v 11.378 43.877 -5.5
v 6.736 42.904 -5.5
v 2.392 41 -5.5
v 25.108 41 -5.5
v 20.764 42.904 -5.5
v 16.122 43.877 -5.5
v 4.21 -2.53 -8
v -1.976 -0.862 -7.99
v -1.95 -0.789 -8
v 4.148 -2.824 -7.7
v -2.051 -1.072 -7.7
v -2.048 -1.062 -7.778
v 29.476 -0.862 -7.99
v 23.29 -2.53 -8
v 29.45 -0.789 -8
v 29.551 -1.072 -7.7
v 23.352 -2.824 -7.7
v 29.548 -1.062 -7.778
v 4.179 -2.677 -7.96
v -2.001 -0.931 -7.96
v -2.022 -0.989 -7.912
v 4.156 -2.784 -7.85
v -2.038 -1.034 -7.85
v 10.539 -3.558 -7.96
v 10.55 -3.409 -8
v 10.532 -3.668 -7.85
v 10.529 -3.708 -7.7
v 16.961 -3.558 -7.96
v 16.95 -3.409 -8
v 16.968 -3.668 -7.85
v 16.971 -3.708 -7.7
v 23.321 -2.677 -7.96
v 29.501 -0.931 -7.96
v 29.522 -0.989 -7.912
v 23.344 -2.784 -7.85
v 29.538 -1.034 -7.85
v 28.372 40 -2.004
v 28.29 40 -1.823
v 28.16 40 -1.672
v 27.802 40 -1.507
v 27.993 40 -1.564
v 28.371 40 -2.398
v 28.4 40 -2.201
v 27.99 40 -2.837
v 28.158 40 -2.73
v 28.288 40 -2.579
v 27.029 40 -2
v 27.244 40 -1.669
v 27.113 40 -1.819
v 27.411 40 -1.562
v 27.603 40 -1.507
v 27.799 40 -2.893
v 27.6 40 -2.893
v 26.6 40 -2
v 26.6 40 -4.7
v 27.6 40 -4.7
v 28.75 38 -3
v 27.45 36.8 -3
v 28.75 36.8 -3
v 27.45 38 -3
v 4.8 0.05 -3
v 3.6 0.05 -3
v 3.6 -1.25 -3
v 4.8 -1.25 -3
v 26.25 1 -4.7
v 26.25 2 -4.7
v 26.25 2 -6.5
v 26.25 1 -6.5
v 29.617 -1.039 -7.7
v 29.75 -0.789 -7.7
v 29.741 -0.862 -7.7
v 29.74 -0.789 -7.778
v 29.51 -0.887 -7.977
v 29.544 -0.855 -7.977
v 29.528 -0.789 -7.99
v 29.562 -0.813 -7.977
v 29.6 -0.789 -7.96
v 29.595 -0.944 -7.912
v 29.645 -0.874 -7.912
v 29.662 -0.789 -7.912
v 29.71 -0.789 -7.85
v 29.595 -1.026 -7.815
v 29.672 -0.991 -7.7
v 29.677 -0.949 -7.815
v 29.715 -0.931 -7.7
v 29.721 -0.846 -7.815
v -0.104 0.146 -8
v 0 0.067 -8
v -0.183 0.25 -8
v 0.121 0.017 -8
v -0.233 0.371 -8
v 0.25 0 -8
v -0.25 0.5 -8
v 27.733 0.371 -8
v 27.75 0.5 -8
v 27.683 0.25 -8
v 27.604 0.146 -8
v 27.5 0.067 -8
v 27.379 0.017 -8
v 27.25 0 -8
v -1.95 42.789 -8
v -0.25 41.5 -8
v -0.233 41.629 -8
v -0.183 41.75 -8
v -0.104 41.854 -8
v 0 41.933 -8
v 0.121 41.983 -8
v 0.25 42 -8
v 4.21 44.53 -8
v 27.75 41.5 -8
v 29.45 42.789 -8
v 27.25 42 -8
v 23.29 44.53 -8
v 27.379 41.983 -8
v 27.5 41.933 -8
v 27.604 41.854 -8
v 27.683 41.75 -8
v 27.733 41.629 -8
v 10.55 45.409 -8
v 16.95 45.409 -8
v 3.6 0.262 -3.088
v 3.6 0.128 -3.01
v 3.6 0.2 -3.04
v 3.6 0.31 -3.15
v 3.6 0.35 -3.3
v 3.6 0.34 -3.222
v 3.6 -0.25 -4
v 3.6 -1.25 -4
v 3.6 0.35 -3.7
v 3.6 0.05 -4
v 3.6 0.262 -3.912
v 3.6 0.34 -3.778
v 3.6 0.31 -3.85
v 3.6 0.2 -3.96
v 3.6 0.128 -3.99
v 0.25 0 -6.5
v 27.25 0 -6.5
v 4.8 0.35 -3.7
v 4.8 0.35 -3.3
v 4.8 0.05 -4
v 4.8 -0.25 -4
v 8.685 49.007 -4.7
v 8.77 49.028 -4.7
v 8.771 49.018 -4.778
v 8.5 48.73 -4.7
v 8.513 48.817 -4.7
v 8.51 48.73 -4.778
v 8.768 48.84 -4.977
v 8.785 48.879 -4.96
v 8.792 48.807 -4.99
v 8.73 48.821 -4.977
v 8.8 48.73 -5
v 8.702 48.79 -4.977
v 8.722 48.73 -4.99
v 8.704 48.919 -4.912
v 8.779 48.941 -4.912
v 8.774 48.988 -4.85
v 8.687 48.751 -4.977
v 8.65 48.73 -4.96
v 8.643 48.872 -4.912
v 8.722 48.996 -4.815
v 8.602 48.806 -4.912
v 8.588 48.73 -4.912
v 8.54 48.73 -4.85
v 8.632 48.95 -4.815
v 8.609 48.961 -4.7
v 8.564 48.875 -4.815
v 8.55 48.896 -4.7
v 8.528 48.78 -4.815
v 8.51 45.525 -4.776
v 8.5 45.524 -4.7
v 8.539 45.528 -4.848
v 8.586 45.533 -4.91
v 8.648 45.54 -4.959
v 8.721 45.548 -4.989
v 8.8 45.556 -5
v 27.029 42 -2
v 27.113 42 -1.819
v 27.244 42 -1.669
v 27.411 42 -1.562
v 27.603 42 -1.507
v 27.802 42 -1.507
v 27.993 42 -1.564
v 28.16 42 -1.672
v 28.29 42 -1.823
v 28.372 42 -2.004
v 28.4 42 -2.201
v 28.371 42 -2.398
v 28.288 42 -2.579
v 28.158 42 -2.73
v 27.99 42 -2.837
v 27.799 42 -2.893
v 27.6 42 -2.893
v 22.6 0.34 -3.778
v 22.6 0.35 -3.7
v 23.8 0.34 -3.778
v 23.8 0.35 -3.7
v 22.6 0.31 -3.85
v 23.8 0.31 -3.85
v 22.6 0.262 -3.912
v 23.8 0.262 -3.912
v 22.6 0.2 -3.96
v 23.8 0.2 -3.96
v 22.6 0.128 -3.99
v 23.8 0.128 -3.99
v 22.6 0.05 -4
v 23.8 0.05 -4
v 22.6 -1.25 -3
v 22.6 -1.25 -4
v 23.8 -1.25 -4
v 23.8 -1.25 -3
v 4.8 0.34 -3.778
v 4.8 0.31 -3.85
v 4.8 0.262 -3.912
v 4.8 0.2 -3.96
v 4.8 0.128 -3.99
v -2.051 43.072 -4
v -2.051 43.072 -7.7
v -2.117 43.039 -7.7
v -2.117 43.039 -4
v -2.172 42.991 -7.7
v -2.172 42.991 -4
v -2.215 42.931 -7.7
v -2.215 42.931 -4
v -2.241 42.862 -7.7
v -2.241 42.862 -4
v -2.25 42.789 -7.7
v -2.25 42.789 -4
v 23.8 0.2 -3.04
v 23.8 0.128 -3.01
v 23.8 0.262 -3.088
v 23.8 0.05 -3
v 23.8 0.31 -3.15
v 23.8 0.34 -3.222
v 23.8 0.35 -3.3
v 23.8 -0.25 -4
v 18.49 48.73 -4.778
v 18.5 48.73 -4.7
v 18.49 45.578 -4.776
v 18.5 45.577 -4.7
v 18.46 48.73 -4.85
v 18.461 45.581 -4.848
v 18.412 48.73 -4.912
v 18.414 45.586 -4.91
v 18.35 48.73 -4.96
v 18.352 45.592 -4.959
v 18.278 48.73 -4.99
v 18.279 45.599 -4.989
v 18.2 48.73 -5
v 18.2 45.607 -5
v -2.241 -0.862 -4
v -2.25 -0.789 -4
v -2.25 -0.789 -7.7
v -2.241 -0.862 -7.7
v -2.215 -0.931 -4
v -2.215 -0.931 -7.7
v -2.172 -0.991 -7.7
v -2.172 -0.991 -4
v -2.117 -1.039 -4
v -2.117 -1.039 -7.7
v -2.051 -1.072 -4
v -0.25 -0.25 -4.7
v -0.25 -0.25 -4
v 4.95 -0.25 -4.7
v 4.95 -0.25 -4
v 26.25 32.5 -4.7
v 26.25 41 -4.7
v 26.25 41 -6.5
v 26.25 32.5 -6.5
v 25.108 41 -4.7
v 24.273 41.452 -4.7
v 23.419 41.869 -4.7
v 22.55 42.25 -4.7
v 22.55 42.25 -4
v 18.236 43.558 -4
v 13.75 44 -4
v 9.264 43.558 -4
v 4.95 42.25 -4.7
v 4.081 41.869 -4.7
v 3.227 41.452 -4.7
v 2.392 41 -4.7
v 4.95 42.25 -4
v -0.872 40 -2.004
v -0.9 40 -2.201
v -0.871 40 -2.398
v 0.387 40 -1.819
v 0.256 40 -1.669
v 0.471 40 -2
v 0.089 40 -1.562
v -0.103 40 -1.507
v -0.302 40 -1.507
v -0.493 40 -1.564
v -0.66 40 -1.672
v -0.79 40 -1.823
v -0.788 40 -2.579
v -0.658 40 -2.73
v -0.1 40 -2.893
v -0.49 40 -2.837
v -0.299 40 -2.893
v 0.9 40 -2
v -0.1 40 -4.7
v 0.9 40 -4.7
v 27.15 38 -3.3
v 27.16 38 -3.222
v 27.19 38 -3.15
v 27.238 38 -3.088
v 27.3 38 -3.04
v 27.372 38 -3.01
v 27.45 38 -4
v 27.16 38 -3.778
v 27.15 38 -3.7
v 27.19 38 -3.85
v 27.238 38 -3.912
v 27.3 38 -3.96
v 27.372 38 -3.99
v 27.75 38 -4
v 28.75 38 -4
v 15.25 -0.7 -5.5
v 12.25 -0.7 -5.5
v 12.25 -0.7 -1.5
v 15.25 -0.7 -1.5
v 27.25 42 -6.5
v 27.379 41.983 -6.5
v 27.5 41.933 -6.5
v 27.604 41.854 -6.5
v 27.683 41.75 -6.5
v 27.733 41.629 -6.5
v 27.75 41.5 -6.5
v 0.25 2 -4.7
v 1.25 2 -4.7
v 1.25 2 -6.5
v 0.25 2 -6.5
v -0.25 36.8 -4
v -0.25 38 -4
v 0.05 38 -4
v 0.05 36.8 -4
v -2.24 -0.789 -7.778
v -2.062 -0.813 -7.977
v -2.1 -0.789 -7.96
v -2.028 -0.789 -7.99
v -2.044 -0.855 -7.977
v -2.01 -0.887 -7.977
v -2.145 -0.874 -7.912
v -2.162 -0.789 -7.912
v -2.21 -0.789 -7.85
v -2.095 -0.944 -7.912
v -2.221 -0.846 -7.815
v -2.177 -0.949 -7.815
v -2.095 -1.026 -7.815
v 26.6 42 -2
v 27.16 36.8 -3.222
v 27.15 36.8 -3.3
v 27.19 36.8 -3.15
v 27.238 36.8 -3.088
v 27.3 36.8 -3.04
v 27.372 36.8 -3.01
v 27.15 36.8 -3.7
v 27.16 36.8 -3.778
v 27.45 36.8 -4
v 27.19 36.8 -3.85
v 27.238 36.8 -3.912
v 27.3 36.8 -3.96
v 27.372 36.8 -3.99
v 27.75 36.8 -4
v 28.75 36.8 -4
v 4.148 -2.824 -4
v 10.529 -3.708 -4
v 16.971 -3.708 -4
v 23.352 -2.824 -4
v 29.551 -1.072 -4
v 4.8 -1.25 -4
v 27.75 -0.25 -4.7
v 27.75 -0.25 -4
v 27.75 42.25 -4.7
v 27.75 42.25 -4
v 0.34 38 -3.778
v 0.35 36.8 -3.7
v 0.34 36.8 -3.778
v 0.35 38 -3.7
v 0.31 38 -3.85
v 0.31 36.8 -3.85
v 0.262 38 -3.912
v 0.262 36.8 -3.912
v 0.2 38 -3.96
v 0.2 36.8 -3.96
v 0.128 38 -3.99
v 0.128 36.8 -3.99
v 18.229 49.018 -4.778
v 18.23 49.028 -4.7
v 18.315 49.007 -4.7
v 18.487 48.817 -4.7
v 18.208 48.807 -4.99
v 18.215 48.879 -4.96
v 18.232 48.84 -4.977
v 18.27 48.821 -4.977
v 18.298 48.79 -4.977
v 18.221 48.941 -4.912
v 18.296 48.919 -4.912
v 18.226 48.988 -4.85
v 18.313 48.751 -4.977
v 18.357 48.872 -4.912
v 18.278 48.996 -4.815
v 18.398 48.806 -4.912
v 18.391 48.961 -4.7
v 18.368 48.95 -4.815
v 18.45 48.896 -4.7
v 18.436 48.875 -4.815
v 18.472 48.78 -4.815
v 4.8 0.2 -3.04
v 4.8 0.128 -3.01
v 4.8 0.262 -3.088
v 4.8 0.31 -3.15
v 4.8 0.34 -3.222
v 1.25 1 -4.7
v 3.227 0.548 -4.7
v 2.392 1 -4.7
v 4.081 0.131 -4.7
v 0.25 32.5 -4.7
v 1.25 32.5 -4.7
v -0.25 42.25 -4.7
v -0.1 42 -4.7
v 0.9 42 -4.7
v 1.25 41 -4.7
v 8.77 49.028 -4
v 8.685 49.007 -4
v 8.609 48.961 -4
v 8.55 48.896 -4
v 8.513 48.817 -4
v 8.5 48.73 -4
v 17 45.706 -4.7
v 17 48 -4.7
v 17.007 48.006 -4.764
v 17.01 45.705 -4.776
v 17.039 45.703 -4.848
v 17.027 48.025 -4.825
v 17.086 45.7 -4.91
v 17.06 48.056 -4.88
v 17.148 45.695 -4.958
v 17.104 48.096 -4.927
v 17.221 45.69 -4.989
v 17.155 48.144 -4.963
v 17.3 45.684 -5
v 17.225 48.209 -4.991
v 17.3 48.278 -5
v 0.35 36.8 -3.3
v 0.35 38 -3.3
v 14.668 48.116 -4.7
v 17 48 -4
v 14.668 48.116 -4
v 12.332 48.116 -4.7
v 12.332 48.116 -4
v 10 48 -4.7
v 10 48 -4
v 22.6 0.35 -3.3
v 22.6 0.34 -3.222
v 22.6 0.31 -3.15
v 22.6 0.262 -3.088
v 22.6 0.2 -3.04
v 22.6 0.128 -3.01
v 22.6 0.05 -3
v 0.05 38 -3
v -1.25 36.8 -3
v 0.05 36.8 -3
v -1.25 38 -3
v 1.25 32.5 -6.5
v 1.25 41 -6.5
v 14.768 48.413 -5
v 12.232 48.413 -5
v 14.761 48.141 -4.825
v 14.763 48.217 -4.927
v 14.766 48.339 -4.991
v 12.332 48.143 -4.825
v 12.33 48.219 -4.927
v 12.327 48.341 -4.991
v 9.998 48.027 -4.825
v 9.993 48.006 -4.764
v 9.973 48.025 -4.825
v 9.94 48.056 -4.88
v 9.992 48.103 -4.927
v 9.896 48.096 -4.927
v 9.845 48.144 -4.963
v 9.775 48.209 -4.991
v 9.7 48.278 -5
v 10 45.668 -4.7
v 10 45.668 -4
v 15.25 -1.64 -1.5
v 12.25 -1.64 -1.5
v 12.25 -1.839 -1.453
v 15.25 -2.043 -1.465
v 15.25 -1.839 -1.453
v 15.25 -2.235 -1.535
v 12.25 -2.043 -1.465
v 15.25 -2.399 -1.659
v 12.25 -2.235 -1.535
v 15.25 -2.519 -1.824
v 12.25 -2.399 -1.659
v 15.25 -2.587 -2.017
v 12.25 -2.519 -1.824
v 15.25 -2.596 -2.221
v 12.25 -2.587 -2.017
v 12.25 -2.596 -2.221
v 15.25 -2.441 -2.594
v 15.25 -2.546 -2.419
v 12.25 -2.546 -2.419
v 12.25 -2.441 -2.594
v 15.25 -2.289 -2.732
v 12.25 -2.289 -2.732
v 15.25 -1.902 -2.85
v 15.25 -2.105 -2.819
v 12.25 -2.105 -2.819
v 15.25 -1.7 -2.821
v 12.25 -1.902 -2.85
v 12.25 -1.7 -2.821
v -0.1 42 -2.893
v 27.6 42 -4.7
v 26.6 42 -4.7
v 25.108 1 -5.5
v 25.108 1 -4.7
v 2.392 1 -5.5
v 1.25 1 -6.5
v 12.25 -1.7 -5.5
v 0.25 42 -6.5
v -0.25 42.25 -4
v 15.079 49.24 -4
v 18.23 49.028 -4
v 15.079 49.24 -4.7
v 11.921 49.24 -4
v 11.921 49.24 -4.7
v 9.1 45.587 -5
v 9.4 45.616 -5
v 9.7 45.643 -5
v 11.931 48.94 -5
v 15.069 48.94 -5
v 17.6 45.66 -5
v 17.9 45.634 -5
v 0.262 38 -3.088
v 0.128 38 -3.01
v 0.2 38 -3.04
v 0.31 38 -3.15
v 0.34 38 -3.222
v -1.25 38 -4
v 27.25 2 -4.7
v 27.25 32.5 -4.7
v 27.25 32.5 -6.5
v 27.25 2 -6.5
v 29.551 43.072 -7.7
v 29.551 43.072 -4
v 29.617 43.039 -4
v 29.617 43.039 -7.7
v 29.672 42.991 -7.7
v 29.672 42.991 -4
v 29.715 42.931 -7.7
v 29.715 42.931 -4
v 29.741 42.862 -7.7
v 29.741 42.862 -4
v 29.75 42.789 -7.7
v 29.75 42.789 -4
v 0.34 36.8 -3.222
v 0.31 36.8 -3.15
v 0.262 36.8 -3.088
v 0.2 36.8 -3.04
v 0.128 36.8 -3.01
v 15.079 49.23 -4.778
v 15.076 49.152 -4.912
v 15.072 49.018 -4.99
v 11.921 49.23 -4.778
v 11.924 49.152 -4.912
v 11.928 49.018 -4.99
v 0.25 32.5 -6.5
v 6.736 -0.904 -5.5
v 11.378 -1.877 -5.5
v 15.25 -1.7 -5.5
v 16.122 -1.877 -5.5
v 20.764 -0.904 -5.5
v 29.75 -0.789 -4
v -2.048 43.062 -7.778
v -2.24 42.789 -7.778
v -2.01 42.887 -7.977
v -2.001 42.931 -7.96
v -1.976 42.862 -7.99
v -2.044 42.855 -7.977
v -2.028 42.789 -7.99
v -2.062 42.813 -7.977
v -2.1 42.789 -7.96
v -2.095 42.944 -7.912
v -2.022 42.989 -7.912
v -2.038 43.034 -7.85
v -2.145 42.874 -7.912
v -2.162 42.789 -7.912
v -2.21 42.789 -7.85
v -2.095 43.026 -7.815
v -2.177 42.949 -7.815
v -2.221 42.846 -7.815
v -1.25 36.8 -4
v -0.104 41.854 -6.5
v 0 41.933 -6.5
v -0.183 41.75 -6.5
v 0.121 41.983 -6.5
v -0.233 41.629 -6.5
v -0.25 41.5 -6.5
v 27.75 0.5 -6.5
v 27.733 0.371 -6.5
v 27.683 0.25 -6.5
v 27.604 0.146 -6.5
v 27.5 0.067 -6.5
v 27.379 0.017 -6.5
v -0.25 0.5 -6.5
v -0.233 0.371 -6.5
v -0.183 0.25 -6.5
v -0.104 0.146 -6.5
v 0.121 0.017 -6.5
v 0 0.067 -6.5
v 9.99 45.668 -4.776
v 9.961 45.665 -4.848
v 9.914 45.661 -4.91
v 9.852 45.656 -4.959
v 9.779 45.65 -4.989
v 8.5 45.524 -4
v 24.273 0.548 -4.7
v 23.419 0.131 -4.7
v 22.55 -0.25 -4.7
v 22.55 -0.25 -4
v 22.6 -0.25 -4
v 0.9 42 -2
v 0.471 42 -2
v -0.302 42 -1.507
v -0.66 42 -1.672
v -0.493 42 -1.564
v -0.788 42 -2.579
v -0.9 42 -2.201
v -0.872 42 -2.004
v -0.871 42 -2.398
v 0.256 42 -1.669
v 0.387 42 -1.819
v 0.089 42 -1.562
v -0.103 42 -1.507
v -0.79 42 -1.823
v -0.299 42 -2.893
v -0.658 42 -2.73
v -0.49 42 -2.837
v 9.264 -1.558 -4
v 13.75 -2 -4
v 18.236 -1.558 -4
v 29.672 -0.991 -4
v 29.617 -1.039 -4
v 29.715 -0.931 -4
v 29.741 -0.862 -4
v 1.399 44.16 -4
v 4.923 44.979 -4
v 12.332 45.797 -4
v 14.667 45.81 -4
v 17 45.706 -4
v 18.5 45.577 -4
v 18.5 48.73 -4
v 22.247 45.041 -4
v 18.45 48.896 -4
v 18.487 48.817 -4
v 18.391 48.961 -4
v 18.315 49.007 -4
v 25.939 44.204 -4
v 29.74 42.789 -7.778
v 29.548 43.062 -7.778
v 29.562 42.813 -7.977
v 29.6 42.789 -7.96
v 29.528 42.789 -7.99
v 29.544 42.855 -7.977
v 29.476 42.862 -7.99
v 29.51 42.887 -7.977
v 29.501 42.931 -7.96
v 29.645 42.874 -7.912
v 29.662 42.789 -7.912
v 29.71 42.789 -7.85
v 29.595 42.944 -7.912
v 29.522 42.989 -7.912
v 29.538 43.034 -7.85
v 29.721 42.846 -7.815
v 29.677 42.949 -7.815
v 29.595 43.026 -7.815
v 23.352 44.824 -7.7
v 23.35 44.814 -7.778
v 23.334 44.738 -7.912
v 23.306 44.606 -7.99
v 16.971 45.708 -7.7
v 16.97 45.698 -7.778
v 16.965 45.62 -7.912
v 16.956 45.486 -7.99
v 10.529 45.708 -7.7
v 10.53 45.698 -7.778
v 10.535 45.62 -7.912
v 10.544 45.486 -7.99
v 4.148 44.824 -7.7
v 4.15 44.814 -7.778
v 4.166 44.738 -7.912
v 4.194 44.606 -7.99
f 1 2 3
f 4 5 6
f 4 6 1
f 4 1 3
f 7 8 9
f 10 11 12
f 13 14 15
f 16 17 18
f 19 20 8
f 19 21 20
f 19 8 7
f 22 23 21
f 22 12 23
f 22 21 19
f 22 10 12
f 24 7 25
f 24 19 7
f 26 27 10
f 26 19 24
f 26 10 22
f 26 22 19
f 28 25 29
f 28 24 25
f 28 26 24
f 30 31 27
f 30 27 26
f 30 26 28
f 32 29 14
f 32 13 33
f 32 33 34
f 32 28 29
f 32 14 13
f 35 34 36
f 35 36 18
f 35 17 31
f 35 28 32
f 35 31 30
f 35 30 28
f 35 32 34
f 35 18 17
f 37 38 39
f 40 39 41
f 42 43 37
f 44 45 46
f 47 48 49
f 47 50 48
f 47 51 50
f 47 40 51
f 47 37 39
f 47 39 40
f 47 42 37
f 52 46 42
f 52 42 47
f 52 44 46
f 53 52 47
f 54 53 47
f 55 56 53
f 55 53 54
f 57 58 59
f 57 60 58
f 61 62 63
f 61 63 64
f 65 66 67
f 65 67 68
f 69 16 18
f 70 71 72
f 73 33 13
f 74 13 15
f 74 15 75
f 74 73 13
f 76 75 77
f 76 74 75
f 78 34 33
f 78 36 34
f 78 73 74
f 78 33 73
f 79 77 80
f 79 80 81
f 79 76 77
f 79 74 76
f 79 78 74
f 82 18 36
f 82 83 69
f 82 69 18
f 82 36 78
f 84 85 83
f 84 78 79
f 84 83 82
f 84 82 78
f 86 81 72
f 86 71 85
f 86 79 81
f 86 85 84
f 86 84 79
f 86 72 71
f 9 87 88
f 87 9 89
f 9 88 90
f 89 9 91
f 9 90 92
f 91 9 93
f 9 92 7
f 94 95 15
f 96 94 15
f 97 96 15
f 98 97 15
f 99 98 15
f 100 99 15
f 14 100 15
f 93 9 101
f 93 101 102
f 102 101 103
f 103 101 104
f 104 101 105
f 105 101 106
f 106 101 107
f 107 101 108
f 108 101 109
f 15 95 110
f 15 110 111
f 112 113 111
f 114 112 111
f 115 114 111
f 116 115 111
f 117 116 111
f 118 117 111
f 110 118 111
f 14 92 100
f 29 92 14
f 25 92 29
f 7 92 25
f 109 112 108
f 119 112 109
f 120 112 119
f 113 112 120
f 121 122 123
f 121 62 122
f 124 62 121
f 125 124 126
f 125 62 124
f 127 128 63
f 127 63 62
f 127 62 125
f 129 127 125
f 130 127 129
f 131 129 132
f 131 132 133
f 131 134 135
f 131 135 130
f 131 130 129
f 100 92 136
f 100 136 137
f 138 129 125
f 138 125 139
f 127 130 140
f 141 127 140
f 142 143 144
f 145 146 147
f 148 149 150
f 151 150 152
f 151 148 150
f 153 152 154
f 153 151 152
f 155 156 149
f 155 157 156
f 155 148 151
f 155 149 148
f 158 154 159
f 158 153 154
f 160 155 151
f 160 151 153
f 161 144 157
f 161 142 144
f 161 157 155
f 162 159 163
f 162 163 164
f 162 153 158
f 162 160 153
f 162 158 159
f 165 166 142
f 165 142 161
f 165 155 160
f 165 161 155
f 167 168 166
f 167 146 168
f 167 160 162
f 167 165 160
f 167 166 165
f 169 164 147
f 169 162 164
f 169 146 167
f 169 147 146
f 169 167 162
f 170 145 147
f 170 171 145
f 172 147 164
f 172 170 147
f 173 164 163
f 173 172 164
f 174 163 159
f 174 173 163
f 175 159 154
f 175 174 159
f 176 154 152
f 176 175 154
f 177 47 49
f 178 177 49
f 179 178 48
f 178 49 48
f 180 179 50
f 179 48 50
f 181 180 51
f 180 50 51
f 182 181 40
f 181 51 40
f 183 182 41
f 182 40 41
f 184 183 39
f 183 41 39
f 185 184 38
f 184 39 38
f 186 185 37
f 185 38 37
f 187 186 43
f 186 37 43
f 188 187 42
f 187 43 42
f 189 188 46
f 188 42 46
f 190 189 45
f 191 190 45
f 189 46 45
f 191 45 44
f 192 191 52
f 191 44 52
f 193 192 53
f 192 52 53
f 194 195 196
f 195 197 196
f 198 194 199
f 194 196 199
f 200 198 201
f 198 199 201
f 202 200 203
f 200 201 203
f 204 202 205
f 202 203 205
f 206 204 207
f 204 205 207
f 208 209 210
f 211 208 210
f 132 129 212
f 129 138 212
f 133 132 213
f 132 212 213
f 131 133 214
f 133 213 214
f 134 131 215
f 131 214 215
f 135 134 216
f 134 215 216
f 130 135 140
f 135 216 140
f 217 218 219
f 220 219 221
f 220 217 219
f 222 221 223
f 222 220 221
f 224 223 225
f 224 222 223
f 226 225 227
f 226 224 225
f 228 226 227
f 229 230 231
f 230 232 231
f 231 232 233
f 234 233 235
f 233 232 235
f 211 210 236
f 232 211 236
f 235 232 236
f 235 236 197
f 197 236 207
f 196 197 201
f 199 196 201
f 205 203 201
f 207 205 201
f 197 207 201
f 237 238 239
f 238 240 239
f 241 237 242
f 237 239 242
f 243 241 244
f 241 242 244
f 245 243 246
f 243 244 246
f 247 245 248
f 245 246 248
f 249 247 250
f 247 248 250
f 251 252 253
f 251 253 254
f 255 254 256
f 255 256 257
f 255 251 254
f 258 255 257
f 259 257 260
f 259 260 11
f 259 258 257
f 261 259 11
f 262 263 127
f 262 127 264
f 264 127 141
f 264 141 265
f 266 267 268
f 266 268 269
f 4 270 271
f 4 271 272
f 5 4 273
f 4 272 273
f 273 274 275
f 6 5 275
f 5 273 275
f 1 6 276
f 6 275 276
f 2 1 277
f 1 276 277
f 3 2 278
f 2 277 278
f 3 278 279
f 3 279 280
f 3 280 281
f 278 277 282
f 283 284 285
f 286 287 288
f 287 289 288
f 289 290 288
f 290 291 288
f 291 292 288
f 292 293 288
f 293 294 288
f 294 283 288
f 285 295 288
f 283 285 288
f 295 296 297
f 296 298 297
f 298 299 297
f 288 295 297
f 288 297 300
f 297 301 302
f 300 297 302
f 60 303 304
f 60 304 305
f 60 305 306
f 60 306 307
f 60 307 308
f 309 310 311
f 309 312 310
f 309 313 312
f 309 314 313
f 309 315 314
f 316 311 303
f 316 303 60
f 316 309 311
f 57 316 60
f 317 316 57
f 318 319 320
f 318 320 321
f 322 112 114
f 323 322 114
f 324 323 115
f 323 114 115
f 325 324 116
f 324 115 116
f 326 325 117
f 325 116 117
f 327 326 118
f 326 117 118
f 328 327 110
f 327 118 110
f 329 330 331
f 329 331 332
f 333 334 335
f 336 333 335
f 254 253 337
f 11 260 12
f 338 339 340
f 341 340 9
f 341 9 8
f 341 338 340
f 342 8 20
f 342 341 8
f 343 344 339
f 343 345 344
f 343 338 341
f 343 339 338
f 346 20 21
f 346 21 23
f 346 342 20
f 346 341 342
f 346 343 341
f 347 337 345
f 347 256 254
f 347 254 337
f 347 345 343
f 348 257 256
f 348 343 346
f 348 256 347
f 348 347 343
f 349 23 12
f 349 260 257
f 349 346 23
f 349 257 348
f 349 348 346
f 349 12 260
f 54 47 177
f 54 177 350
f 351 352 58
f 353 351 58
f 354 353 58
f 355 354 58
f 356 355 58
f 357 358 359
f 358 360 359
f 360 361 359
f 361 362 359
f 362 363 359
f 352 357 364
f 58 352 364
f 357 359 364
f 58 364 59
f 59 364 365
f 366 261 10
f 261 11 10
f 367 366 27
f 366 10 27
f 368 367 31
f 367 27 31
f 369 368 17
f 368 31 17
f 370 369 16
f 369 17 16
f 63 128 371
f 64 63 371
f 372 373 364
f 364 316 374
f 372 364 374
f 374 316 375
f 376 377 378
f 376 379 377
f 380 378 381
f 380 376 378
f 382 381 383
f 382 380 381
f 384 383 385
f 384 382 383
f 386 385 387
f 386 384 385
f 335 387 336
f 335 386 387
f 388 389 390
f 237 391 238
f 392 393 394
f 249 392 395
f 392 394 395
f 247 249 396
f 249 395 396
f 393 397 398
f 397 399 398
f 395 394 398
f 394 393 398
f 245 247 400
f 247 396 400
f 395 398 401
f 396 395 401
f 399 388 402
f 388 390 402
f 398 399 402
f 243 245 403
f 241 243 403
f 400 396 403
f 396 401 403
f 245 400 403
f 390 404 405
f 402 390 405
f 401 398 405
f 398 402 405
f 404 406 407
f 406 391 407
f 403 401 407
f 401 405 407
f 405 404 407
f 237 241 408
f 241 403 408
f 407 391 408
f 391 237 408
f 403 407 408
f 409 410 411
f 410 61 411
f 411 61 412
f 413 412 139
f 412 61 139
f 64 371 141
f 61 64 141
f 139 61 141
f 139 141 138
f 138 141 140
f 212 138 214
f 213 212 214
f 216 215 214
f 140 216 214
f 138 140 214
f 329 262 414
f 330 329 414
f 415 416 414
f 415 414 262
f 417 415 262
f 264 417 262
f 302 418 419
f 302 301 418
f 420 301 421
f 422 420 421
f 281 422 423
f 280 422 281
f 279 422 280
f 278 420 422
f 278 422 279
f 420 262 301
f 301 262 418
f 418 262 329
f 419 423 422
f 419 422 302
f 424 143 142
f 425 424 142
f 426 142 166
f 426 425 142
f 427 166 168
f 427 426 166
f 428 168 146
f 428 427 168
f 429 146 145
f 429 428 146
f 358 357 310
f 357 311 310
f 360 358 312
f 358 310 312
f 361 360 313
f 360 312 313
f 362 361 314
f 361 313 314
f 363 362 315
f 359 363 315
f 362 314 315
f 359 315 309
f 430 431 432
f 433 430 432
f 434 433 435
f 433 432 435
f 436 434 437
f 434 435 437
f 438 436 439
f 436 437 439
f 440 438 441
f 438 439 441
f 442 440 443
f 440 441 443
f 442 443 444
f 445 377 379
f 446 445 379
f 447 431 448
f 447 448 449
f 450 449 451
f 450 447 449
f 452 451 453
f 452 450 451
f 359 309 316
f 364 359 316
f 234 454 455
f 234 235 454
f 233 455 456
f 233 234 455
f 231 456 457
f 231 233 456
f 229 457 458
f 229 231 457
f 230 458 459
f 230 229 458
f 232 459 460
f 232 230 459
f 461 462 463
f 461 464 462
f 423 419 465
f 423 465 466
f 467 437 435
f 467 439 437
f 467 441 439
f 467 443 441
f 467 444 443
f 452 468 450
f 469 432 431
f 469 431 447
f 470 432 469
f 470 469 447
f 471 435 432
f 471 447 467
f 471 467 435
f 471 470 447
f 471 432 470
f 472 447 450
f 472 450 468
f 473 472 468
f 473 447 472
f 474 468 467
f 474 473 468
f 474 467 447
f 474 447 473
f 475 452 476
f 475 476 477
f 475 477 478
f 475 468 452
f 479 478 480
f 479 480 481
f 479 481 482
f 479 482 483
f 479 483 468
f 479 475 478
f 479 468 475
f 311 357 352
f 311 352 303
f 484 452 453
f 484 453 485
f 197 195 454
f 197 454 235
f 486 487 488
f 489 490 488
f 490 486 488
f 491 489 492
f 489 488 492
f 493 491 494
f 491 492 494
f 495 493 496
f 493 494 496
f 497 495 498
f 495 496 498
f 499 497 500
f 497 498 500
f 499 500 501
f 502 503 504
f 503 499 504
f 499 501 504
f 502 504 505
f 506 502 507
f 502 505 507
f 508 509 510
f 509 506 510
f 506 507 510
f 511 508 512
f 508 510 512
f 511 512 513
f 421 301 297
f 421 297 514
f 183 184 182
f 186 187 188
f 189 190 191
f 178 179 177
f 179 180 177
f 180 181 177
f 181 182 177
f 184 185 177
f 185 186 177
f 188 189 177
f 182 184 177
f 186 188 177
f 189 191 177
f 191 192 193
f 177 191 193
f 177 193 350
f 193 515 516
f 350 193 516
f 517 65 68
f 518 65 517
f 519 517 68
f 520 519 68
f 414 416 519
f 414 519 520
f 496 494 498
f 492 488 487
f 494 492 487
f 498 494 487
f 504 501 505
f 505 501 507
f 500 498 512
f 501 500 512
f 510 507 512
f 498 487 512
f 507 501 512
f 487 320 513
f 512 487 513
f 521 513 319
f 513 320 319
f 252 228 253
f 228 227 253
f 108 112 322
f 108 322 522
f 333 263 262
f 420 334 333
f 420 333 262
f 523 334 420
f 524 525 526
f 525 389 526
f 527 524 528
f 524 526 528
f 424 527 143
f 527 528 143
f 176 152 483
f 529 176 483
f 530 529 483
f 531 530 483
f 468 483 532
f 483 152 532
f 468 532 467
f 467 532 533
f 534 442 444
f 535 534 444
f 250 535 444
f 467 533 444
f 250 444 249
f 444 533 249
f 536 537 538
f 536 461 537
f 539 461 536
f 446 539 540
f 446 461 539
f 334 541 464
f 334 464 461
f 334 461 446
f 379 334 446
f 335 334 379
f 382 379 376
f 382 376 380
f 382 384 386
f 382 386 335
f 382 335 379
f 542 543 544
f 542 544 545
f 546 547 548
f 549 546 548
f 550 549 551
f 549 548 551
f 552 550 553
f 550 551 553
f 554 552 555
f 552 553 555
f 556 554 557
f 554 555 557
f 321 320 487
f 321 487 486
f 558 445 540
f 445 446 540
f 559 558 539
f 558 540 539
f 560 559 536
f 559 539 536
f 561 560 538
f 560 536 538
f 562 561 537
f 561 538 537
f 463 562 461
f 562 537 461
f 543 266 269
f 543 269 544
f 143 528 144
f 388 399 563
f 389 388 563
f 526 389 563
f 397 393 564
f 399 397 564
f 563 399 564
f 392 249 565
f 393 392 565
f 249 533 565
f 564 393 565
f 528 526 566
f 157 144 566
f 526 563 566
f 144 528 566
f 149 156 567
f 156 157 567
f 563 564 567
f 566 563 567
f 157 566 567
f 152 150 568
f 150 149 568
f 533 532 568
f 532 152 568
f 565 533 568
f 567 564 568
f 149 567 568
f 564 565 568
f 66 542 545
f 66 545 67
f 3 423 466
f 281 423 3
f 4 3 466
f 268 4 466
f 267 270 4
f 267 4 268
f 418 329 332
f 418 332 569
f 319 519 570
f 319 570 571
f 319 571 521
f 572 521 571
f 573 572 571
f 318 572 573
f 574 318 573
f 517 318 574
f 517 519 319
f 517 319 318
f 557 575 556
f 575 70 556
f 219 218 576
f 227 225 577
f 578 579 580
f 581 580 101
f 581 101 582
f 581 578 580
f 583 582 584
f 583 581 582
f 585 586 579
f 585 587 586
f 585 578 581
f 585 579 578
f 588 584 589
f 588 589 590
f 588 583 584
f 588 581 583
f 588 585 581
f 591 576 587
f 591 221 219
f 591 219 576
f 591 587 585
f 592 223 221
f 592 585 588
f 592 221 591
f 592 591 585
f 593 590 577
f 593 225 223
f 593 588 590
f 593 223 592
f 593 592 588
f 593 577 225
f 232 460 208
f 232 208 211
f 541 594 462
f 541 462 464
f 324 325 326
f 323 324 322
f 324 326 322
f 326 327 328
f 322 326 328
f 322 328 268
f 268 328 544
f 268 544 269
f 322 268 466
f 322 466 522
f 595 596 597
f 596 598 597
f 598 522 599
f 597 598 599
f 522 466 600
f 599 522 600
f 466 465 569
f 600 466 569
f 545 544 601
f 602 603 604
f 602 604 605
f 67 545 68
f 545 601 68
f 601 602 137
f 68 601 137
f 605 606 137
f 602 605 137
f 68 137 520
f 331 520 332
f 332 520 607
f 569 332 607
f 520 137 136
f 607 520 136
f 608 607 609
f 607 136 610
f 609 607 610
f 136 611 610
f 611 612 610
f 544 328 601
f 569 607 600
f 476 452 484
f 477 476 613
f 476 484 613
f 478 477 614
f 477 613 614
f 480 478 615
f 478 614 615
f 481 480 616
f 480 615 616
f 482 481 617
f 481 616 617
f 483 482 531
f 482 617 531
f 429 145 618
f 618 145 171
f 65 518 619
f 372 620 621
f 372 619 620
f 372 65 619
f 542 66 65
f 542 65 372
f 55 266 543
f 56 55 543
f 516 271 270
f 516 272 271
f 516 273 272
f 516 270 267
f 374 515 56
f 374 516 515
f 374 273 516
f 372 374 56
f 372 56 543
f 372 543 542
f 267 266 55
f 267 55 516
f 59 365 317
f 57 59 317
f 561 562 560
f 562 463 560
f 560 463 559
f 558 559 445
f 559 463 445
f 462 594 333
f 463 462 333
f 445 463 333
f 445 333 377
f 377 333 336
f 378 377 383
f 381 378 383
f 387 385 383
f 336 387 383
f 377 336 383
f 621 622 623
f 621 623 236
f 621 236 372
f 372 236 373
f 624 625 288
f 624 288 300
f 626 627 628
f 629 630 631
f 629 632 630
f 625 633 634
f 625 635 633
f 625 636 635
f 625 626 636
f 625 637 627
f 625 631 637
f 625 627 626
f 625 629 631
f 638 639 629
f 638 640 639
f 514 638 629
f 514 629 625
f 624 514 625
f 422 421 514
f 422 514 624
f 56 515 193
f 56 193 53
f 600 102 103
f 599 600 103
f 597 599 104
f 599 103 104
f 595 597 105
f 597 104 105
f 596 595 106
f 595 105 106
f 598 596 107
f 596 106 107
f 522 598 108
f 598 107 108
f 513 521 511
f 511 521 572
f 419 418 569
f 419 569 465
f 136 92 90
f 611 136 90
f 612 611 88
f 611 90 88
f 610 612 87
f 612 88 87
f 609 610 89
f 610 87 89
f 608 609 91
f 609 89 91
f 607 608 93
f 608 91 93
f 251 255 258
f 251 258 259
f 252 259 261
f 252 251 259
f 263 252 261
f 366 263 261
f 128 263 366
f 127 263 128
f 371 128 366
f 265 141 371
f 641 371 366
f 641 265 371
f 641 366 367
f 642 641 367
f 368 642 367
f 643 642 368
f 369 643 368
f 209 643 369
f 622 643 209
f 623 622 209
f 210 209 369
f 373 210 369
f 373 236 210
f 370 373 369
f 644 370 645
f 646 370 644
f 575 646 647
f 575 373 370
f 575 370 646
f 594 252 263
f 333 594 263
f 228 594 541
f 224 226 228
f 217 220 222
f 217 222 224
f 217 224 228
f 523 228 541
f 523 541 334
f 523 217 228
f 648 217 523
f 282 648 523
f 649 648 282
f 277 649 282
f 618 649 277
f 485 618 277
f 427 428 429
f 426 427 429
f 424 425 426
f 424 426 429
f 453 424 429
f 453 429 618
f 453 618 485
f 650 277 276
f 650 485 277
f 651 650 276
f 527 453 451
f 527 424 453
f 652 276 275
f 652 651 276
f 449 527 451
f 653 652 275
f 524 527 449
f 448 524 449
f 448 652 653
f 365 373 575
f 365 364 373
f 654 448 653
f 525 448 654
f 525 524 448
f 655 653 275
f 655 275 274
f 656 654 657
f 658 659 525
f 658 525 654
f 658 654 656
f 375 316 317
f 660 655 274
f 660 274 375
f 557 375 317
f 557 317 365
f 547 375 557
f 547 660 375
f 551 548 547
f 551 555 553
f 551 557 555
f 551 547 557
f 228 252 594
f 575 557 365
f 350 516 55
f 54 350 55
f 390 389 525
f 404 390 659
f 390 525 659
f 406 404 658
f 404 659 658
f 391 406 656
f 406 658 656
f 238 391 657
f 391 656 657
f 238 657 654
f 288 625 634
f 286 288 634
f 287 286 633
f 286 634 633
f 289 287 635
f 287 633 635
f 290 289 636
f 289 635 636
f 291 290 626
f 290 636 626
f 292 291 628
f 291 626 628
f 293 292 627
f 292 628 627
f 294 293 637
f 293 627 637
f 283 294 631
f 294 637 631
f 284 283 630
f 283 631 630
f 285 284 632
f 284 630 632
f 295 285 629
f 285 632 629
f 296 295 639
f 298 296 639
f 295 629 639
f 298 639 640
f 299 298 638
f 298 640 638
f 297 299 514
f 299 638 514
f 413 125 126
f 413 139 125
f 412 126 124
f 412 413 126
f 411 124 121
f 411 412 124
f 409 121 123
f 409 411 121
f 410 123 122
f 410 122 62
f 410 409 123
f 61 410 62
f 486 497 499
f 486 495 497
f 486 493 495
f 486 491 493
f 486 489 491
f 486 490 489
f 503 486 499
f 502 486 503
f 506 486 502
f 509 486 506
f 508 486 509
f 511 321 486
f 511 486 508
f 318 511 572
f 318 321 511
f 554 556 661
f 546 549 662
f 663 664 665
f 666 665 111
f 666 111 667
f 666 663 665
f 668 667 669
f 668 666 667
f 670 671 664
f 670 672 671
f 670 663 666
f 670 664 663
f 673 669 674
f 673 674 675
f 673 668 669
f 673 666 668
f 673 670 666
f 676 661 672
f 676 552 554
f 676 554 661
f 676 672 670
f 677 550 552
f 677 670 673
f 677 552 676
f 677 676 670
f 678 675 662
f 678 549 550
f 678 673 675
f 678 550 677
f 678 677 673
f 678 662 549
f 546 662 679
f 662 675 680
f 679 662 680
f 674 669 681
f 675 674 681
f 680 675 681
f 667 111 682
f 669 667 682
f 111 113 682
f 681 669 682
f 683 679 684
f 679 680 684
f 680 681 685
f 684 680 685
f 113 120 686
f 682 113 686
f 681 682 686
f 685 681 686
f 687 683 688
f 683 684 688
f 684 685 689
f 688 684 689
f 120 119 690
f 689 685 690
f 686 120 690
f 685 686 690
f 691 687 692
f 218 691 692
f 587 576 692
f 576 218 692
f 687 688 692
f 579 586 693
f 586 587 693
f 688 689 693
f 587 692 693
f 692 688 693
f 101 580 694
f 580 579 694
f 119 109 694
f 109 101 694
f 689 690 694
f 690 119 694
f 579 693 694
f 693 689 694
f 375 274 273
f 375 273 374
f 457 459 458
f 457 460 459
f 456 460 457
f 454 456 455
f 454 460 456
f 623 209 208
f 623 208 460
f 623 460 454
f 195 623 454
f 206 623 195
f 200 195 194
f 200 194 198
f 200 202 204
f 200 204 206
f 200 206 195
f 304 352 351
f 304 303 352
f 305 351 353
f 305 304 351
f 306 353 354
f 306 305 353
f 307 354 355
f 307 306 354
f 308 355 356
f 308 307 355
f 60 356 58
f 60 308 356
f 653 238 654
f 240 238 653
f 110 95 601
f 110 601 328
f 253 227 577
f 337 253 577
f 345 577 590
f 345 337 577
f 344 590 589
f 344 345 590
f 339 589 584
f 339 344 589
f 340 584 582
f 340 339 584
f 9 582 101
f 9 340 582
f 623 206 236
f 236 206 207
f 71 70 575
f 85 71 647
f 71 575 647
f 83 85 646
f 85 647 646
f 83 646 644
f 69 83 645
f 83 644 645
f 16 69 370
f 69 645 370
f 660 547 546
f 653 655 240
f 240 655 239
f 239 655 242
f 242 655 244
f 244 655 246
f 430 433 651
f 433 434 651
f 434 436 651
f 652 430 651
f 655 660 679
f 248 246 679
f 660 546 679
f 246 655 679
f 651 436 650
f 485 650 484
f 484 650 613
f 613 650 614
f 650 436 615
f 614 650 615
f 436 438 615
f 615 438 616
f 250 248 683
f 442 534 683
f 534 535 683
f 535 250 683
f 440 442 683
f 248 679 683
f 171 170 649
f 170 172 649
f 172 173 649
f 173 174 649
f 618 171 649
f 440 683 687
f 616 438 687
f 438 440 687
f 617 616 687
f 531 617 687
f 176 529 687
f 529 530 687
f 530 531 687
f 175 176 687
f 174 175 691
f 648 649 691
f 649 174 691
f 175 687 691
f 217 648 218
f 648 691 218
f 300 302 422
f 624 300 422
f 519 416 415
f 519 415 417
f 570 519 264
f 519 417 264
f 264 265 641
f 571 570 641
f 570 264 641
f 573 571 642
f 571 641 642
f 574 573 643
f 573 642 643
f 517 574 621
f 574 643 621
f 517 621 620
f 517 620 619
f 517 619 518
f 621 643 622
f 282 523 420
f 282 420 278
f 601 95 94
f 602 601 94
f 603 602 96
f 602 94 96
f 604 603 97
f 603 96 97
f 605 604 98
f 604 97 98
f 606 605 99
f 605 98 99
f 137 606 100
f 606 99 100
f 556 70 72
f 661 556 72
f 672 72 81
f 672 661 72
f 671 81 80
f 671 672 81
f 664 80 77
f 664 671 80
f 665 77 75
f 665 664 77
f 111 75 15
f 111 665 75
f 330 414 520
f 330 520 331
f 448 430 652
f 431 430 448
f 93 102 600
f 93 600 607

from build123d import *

# Parameters (mm, degrees)
CYLINDER001_R             = 0.7
CYLINDER001_DEPTH         = 2
CYLINDER001_ROLL_ANGLE    = 90
BOX005_W                  = 1
BOX005_H                  = 2
BOX005_DEPTH              = 3
FUSION002_PLACEMENT_ANGLE = 180
CYLINDER003_R             = 0.7
CYLINDER003_DEPTH         = 3
CYLINDER003_PITCH_ANGLE   = 90
BOX007_W                  = 3
BOX007_H                  = 1
BOX007_DEPTH              = 4.5
SKETCH023_W               = 1.2
SKETCH023_H               = 1.6
SKETCH023_W_2             = 1.6
SKETCH023_H_2             = 1.2
PAD005_DEPTH              = 1
FILLET010_R               = 0.3
PAD001_DEPTH              = 4
POCKET_DEPTH              = 1.5
POCKET001_DEPTH           = 3.5
SKETCH004_W               = 28
SKETCH004_H               = 42.5
POCKET002_DEPTH           = 0.7
POCKET005_DEPTH           = 1.5
FILLET007_R               = 0.3
PAD006_DEPTH              = 1
FILLET008_R               = 0.3
CYLINDER002_R             = 0.7
CYLINDER002_DEPTH         = 2
CYLINDER002_ROLL_ANGLE    = 90
BOX006_W                  = 1
BOX006_H                  = 2
BOX006_DEPTH              = 3


with BuildPart() as cylinder:
    # Cylinder001 → Cylinder001 (new body)
    with BuildSketch(Plane.XY):
        Circle(CYLINDER001_R)
    extrude(amount=CYLINDER001_DEPTH)


with BuildPart() as cylinder_1:
    # Cylinder001 roll: moved
    add(cylinder.part.rotate(Axis((0, 0, 0), (1, 0, 0)), CYLINDER001_ROLL_ANGLE))


with BuildPart() as cylinder_2:
    # Cylinder001 placement: moved
    add(cylinder_1.part.moved(Location((-0.2, 42, 1.8))))


with BuildPart() as fusion002:
    # Box005 → Box005 (new body)
    with BuildSketch(Plane(origin=(-0.1, 40, -1), x_dir=(1, 0, 0), z_dir=(0, 0, 1))):
        with Locations((0.5, 1)):
            Rectangle(BOX005_W, BOX005_H)
    extrude(amount=BOX005_DEPTH)

    # Fusion002: union Cylinder
    add(cylinder_2.part)


with BuildPart() as fusion002_1:
    # Fusion002 placement: moved
    add(fusion002.part.moved(Location((27.5, 82, 0))).rotate(Axis((27.5, 82, 0), (0, 0, 1)), FUSION002_PLACEMENT_ANGLE))


with BuildPart() as cylinder002:
    # Cylinder003 → Cylinder003 (new body)
    with BuildSketch(Plane.XY):
        Circle(CYLINDER003_R)
    extrude(amount=CYLINDER003_DEPTH)


with BuildPart() as cylinder002_1:
    # Cylinder003 pitch: moved
    add(cylinder002.part.rotate(Axis((0, 0, 0), (0, 1, 0)), CYLINDER003_PITCH_ANGLE))


with BuildPart() as cylinder002_2:
    # Cylinder003 placement: moved
    add(cylinder002_1.part.moved(Location((12.25, -1.9, 1.85))))


with BuildPart() as fusion_conn_top:
    # Box007 → Box007 (new body)
    with BuildSketch(Plane(origin=(12.25, -1.7, -2), x_dir=(1, 0, 0), z_dir=(0, 0, 1))):
        with Locations((1.5, 0.5)):
            Rectangle(BOX007_W, BOX007_H)
    extrude(amount=BOX007_DEPTH)

    # Fusion004: union Cylinder002
    add(cylinder002_2.part)


with BuildPart() as fillet010:
    # Sketch023 → Pad005 (new body)
    with BuildSketch(Plane.XY):
        with Locations((4.2, -0.45)):
            Rectangle(SKETCH023_W, SKETCH023_H)
        with Locations((23.2, -0.45)):
            Rectangle(SKETCH023_W, SKETCH023_H)
        with Locations((-0.45, 37.4)):
            Rectangle(SKETCH023_W_2, SKETCH023_H_2)
        with Locations((27.95, 37.4)):
            Rectangle(SKETCH023_W_2, SKETCH023_H_2)
    extrude(amount=PAD005_DEPTH)

    # Fillet010
    fillet010_edges = [fillet010.edges().sort_by_distance(p)[0] for p in [
        (27.15, 37.4, 0),
        (27.15, 37.4, 1),
        (0.35, 37.4, 0),
        (0.35, 37.4, 1),
        (4.2, 0.35, 0),
        (4.2, 0.35, 1),
        (23.2, 0.35, 0),
        (23.2, 0.35, 1),
    ]]
    fillet(fillet010_edges, radius=FILLET010_R)


with BuildPart() as fillet007_top:
    # Sketch → Pad001 (new body)
    with BuildSketch(Plane(origin=(13.75, 21, -4), x_dir=(1, 0, 0), z_dir=(0, 0, 1))):
        with BuildLine():
            ThreePointArc((16, 22), (0, 24.8188), (-16, 22))
            Line((-16, 22), (-16, -22))
            ThreePointArc((-16, -22), (0, -24.8188), (16, -22))
            Line((16, -22), (16, 22))
        make_face()
    extrude(amount=PAD001_DEPTH)

    # Sketch002 → Pocket (cut)
    with BuildSketch(Plane(origin=(13.75, 21, -4), x_dir=(1, 0, 0), z_dir=(0, 0, -1))):
        with BuildLine():
            Line((-13.5, 21), (13.5, 21))
            ThreePointArc((14, 20.5), (13.853553, 20.853553), (13.5, 21))
            Line((14, 20.5), (14, -20.5))
            ThreePointArc((13.5, -21), (13.853553, -20.853553), (14, -20.5))
            Line((13.5, -21), (-13.5, -21))
            ThreePointArc((-14, -20.5), (-13.853553, -20.853553), (-13.5, -21))
            Line((-14, -20.5), (-14, 20.5))
            ThreePointArc((-13.5, 21), (-13.853553, 20.853553), (-14, 20.5))
        make_face()
    extrude(amount=-POCKET_DEPTH, mode=Mode.SUBTRACT)

    # Sketch003 → Pocket001 (cut)
    with BuildSketch(Plane(origin=(13.75, 21, 0), x_dir=(1, 0, 0), z_dir=(0, 0, 1))):
        Polygon((-13.5, -19), (-13.5, 11.5), (-12.5, 11.5), (-12.5, 20), (12.5, 20), (12.5, 11.5), (13.5, 11.5), (13.5, -19), (12.5, -19), (12.5, -20), (-12.5, -20), (-12.5, -19), align=None)
    extrude(amount=-POCKET001_DEPTH, mode=Mode.SUBTRACT)

    # Sketch004 → Pocket002 (cut)
    with BuildSketch(Plane(origin=(13.75, 21, 0), x_dir=(1, 0, 0), z_dir=(0, 0, 1))):
        Rectangle(SKETCH004_W, SKETCH004_H)
    extrude(amount=-POCKET002_DEPTH, mode=Mode.SUBTRACT)

    # Sketch008 → Pocket005 (cut)
    with BuildSketch(Plane(origin=(13.75, 21, 0), x_dir=(1, 0, 0), z_dir=(0, 0, 1))):
        with BuildLine():
            ThreePointArc((12, 19.621417), (0, 23), (-12, 19.621417))
            Line((-12, 19.621417), (12, 19.621417))
        make_face()
        with BuildLine():
            ThreePointArc((-12, -19.621417), (0, -23), (12, -19.621417))
            Line((-12, -19.621417), (12, -19.621417))
        make_face()
    extrude(amount=-POCKET005_DEPTH, mode=Mode.SUBTRACT)

    # Fillet007
    fillet007_edges = [fillet007_top.edges().sort_by_distance(p)[0] for p in [
        (-2.25, 21, -4),
        (-2.25, 43, -2),
        (13.75, 45.8188, -4),
        (29.75, 43, -2),
        (29.75, 21, -4),
        (29.75, -1, -2),
        (13.75, -3.8188, -4),
        (-2.25, -1, -2),
    ]]
    fillet(fillet007_edges, radius=FILLET007_R)


with BuildPart() as fillet008_hanger_top:
    # Sketch019 → Pad006 (new body)
    with BuildSketch(Plane(origin=(13.5, 1, -1), x_dir=(1, 0, 0), z_dir=(0, 0, 1))):
        with BuildLine():
            ThreePointArc((5, 48), (0, 48.266714), (-5, 48))
            Line((-5, 48), (-5, 44))
            Line((-5, 44), (-3.5, 44))
            Line((-3.5, 47), (-3.5, 44))
            ThreePointArc((3.5, 47), (0, 47.130139), (-3.5, 47))
            Line((3.5, 44), (3.5, 47))
            Line((5, 44), (3.5, 44))
            Line((5, 48), (5, 44))
        make_face()
    extrude(amount=PAD006_DEPTH)

    # Fillet008
    fillet008_edges = [fillet008_hanger_top.edges().sort_by_distance(p)[0] for p in [
        (18.5, 47, -1),
        (17, 46.5, -1),
        (18.5, 49, -0.5),
        (13.5, 49.266714, -1),
        (13.5, 48.130139, -1),
        (10, 46.5, -1),
        (8.5, 47, -1),
        (8.5, 49, -0.5),
    ]]
    fillet(fillet008_edges, radius=FILLET008_R)


with BuildPart() as cylinder001:
    # Cylinder002 → Cylinder002 (new body)
    with BuildSketch(Plane.XY):
        Circle(CYLINDER002_R)
    extrude(amount=CYLINDER002_DEPTH)


with BuildPart() as cylinder001_1:
    # Cylinder002 roll: moved
    add(cylinder001.part.rotate(Axis((0, 0, 0), (1, 0, 0)), CYLINDER002_ROLL_ANGLE))


with BuildPart() as cylinder001_2:
    # Cylinder002 placement: moved
    add(cylinder001_1.part.moved(Location((-0.2, 42, 1.8))))


with BuildPart() as fusion016:
    # Box006 → Box006 (new body)
    with BuildSketch(Plane(origin=(-0.1, 40, -1), x_dir=(1, 0, 0), z_dir=(0, 0, 1))):
        with Locations((0.5, 1)):
            Rectangle(BOX006_W, BOX006_H)
    extrude(amount=BOX006_DEPTH)

    # Fusion015: union Cylinder001
    add(cylinder001_2.part)

    # Fusion016: union Fusion002, Fusion-conn-top, Fillet010, Fillet007-top, Fillet008-hanger-top
    add(fusion002_1.part)
    add(fusion_conn_top.part)
    add(fillet010.part)
    add(fillet007_top.part)
    add(fillet008_hanger_top.part)


with BuildPart() as fusion016_1:
    # Fusion016 placement: moved
    add(fusion016.part.moved(Location((0, 0, -4))))


solid = fusion016_1.part
